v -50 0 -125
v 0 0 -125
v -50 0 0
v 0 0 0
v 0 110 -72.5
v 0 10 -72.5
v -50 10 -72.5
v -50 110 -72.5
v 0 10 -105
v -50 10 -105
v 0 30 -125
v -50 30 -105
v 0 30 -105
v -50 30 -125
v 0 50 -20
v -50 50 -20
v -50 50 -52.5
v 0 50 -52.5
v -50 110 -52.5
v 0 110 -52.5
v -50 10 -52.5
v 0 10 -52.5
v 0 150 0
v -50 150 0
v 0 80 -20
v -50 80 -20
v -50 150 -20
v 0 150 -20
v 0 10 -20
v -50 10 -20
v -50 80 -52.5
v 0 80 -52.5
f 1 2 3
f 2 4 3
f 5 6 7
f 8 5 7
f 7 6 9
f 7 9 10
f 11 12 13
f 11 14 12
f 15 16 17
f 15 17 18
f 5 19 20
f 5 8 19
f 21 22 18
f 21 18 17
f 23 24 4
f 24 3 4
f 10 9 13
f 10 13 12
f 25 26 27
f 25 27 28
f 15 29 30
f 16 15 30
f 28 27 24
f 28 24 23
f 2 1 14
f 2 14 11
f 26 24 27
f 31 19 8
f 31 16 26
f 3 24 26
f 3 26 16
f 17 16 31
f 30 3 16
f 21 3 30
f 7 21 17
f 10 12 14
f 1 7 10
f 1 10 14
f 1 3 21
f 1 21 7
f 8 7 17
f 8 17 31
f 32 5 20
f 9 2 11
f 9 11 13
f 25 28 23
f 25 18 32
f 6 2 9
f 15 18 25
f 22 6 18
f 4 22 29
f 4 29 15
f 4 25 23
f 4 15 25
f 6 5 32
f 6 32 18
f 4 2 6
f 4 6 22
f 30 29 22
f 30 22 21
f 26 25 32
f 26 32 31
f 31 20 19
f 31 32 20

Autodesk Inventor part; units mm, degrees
ref_plane "YZ Plane" through (0, 0, 0) normal (1, 0, 0) x (0, 1, 0)
ref_plane "XZ Plane" through (0, 0, 0) normal (0, 1, 0) x (-1, 0, 0)
ref_plane "XY Plane" through (0, 0, 0) normal (0, 0, 1) x (1, 0, 0)
sketch "Sketch1" plane through (0, 0, 0) normal (0, 1, 0) x (-1, 0, 0)
  line L0 (0, 0) -> (50, 0)
  line L1 (50, 0) -> (50, -125)
  line L2 (50, -125) -> (0, -125)
  line L3 (0, -125) -> (0, 0)
  dimension "d0" = 50
  dimension "d1" = 125
extrude "Extrusion1" add sketch "Sketch1" along normal blind 10
sketch "Sketch2" plane through (0, 10, 0) normal (0, 1, 0) x (1, 0, 0)
  line L0 (-50, 125) -> (-50, 0) projected
  line L1 (0, 0) -> (0, 125) projected
  line L2 (-50, 0) -> (0, 0)
  line L3 (0, 0) -> (0, 20)
  line L4 (0, 20) -> (-50, 20)
  line L5 (-50, 20) -> (-50, 0)
  line L6 (0, 125) -> (-50, 125) projected
  line L7 (-50, 125) -> (0, 125)
  line L8 (0, 125) -> (0, 105)
  line L9 (0, 105) -> (-50, 105)
  line L10 (-50, 105) -> (-50, 125)
  line L11 (-50, 62.5) -> (0, 62.5)
  line L12 (0, 62.5) -> (0, 72.5)
  line L13 (0, 72.5) -> (-50, 72.5)
  line L14 (-50, 72.5) -> (-50, 62.5)
  line L15 (-50, 62.5) -> (0, 62.5)
  line L16 (0, 62.5) -> (0, 52.5)
  line L17 (0, 52.5) -> (-50, 52.5)
  line L18 (-50, 52.5) -> (-50, 62.5)
  dimension "d4" = 20
  dimension "d5" = 20
  dimension "d6" = 10
  dimension "d7" = 10
extrude "Extrusion2" add sketch "Sketch2" along normal blind 20 contours L6 L1 L9 L0 | L13 L1 L11 L0 | L11 L1 L17 L0 | L4 L1 L2 L0
sketch "Sketch3" plane through (0, 30, 0) normal (0, 1, 0) x (1, 0, 0)
  line L0 (0, 20) -> (0, 52.5) projected
  line L1 (-50, 0) -> (0, 0)
  line L2 (0, 0) -> (0, 20)
  line L3 (0, 20) -> (-50, 20)
  line L4 (-50, 20) -> (-50, 0)
  line L5 (-50, 52.5) -> (0, 52.5) projected
  line L6 (0, 72.5) -> (-50, 72.5) projected
  line L7 (-50, 52.5) -> (0, 52.5)
  line L8 (0, 52.5) -> (0, 72.5)
  line L9 (0, 72.5) -> (-50, 72.5)
  line L10 (-50, 72.5) -> (-50, 52.5)
extrude "Extrusion3" add sketch "Sketch3" along normal blind 100
sketch "Sketch4" plane through (0, 10, -20) normal (0, 0, -1) x (-1, 0, 0)
  line L0 (0, 0) -> (0, 120) projected
  line L1 (50, 0) -> (50, 120) projected
  line L2 (0, 120) -> (50, 120)
  line L3 (50, 120) -> (50, 100)
  line L4 (50, 100) -> (0, 100)
  line L5 (0, 100) -> (0, 120)
  line L6 (50, 100) -> (0, 100)
  line L7 (0, 100) -> (0, 70)
  line L8 (0, 70) -> (50, 70)
  line L9 (50, 70) -> (50, 100)
  line L10 (0, 70) -> (50, 70)
  line L11 (50, 70) -> (50, 40)
  line L12 (50, 40) -> (0, 40)
  line L13 (0, 40) -> (0, 70)
  point P0 (0, -10)
  dimension "d12" = 20
  dimension "d13" = 30
  dimension "d14" = 30
extrude "Extrusion4" add sketch "Sketch4" along normal blind 40 contours L0 L8 L1 L12
sketch "Sketch5" plane through (0, 130, 0) normal (0, 1, 0) x (1, 0, 0)
  line L0 (-50, 105) -> (-50, 72.5) projected
  line L1 (0, 52.5) -> (-50, 52.5)
  line L2 (-50, 52.5) -> (-50, 72.5)
  line L3 (-50, 72.5) -> (0, 72.5)
  line L4 (0, 72.5) -> (0, 52.5)
  point P0 (0, 0)
extrude "Extrusion5" cut sketch "Sketch5" against normal blind 20
sketch "Sketch6" plane through (0, 0, 0) normal (1, 0, 0) x (0, 0, -1)
  point P0 (0, 0)
sketch "Sketch7" plane through (0, 130, 0) normal (0, 1, 0) x (1, 0, 0)
  line L0 (-50, 0) -> (0, 0) projected
  line L1 (-50, 20) -> (0, 20) projected
  line L2 (0, 0) -> (-50, 0)
  line L3 (-50, 0) -> (-50, 20)
  line L4 (-50, 20) -> (0, 20)
  line L5 (0, 20) -> (0, 0)
extrude "Extrusion6" add sketch "Sketch7" along normal blind 20
equation "\"BendRadius\" = Thickness"
equation "\"BendReliefWidth\" = Thickness"
equation "\"BendReliefDepth\" = 0.5 * Thickness"
equation "\"CornerReliefSize\" = 4 * Thickness"
equation "\"MinimumRemnant\" = 2 * Thickness"
equation "\"TransitionRadius\" = BendRadius"
equation "\"JacobiRadiusSize\" = BendRadius"
equation "\"GapSize\" = Thickness"
equation "\"Thickness\" = 0.5"
